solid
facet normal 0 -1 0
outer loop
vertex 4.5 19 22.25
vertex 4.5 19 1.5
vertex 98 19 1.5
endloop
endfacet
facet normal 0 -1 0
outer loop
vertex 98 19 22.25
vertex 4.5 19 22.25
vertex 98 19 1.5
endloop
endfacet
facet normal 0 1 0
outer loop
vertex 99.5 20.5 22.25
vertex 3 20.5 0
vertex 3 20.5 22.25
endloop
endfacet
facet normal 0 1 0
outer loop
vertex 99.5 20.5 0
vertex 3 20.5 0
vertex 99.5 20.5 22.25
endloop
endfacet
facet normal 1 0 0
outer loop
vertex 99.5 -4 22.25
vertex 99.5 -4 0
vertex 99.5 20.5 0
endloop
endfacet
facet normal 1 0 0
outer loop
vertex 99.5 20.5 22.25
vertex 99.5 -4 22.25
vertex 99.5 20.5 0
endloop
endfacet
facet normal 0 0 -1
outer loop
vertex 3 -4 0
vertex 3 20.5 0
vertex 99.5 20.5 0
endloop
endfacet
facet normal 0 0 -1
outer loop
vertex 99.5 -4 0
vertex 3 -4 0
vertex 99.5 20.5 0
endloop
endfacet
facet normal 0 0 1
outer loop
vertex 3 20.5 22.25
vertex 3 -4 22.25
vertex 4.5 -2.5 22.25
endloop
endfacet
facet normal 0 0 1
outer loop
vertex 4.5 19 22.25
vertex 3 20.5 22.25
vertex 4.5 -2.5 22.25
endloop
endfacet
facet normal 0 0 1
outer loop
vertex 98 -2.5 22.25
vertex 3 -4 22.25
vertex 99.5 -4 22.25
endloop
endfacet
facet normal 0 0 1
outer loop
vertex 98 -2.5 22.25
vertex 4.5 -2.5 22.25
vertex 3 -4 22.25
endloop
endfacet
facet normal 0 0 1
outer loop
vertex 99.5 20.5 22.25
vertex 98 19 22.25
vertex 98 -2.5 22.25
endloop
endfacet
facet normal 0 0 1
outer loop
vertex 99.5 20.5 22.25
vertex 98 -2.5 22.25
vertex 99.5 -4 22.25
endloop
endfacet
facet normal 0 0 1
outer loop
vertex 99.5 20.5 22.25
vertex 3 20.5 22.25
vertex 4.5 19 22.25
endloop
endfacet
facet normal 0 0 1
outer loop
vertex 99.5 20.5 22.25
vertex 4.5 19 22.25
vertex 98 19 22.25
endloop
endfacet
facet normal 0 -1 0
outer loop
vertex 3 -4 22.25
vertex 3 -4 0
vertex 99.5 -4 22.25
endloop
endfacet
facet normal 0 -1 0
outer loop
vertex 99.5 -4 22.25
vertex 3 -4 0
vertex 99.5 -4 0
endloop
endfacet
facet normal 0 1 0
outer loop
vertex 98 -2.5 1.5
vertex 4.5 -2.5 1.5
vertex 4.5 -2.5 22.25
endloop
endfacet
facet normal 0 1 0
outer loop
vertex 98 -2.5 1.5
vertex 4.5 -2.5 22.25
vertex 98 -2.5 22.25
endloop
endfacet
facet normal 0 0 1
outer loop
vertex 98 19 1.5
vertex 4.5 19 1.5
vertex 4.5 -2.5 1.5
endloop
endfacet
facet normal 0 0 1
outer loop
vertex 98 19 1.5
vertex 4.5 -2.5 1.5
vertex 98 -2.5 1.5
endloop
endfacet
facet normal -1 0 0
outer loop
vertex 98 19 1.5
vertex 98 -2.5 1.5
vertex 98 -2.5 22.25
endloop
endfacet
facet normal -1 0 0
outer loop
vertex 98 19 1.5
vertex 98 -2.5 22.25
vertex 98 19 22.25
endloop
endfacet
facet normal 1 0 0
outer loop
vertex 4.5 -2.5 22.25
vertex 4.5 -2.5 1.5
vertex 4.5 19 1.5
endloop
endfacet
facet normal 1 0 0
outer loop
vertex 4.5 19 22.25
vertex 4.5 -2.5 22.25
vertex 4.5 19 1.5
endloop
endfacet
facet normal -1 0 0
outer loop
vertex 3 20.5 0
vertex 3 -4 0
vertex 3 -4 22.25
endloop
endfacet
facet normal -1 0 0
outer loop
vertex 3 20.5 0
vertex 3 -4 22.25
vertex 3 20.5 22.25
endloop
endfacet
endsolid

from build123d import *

# Parameters (mm, degrees)
BOX001_W           = 93.5
BOX001_H           = 21.5
BOX001_DEPTH       = 20.75
BOX015001015_W     = 96.5
BOX015001015_H     = 24.5
BOX015001015_DEPTH = 22.25


with BuildPart() as cube016:
    # Box001 → Box001 (new body)
    with BuildSketch(Plane(origin=(1.5, 1.5, 1.5), x_dir=(1, 0, 0), z_dir=(0, 0, 1))):
        with Locations((46.75, 10.75)):
            Rectangle(BOX001_W, BOX001_H)
    extrude(amount=BOX001_DEPTH)


with BuildPart() as cut004014:
    # Box015001015 → Box015001015 (new body)
    with BuildSketch(Plane.XY):
        with Locations((48.25, 12.25)):
            Rectangle(BOX015001015_W, BOX015001015_H)
    extrude(amount=BOX015001015_DEPTH)

    # Cut004014: cut Cube016
    add(cube016.part, mode=Mode.SUBTRACT)


with BuildPart() as cut004014_1:
    # Cut004014 placement: moved
    add(cut004014.part.moved(Location((3, -4, 0))))


solid = cut004014_1.part
